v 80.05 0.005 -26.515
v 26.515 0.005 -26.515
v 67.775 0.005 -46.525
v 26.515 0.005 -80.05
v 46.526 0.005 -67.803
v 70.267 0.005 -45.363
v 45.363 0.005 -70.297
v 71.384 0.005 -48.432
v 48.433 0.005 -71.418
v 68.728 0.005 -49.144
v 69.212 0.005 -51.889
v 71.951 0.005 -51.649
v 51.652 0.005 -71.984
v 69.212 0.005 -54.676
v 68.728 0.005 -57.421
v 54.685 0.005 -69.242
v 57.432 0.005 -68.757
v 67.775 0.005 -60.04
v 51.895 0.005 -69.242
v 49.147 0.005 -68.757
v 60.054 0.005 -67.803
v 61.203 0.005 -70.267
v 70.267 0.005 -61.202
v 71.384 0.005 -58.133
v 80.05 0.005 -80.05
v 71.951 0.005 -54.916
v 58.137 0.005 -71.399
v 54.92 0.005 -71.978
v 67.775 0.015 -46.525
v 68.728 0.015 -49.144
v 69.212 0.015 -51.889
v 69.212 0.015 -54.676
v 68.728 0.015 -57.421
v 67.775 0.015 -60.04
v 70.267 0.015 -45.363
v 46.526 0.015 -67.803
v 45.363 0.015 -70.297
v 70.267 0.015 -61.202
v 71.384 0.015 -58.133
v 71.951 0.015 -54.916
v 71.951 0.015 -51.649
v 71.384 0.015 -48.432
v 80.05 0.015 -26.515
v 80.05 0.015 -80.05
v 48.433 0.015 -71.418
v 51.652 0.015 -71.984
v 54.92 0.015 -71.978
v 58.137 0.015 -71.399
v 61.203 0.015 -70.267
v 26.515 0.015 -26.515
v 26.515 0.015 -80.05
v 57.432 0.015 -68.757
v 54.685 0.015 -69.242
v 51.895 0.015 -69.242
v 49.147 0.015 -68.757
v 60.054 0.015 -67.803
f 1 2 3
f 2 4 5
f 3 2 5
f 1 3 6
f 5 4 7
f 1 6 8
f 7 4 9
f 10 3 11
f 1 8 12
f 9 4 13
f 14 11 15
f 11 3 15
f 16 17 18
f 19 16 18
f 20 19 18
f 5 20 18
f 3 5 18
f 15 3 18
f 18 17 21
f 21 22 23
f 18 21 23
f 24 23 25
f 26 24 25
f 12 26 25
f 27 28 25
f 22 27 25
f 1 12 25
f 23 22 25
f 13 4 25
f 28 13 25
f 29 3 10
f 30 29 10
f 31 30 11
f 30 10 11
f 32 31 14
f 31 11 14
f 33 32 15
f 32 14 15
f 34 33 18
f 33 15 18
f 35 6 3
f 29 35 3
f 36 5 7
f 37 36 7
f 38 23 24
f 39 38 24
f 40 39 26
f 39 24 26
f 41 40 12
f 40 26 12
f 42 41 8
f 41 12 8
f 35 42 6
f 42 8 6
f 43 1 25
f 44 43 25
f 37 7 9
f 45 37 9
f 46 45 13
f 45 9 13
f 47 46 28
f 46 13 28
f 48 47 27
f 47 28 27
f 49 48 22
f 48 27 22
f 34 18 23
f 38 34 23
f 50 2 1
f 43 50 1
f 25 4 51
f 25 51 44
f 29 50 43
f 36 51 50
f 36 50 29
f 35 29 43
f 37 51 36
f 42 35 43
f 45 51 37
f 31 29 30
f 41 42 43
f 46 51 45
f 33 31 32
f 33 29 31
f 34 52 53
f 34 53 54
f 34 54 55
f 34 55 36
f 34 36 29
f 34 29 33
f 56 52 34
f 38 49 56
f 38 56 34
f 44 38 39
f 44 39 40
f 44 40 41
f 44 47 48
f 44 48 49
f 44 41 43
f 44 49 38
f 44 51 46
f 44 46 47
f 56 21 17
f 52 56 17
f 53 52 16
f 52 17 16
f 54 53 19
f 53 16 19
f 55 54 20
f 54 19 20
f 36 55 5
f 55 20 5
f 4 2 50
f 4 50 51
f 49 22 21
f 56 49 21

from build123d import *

# Parameters (mm, degrees)
SKETCH1_W           = 107.07
SKETCH1_H           = 107.07
BOSS_EXTRUDE1_DEPTH = 0.02
SCALE1_SCALE        = 0.5


with BuildPart() as part:
    # Sketch1 → Boss-Extrude1 (new body)
    with BuildSketch(Plane(origin=(0, 0, 0), x_dir=(1, 0, 0), z_dir=(0, 1, 0))):
        with Locations((53.535, 53.535)):
            Rectangle(SKETCH1_W, SKETCH1_H)
        with BuildLine():
            Line((40.02098899, 82.576362505), (37.69526755, 87.563888229))
            ThreePointArc((37.69526755, 87.563888229), (53.541760789, 91.075404612), (69.37473245, 87.503415858))
            Line((69.37473245, 87.503415858), (67.077209739, 82.576362505))
            ThreePointArc((67.077209739, 82.576362505), (53.549099365, 85.57547237), (40.02098899, 82.576362505))
        make_face(mode=Mode.SUBTRACT)
        with BuildLine():
            Line((82.518723029, 67.05033201), (87.503415858, 69.37473245))
            ThreePointArc((87.503415858, 69.37473245), (91.015, 53.535), (87.503415858, 37.69526755))
            Line((87.503415858, 37.69526755), (82.518723029, 40.01966799))
            ThreePointArc((82.518723029, 40.01966799), (85.515, 53.535), (82.518723029, 67.05033201))
        make_face(mode=Mode.SUBTRACT)
    extrude(amount=BOSS_EXTRUDE1_DEPTH)


with BuildPart() as part_1:
    # Scale1: scaled about (53.030506877, 0.01, -53.029916686)
    add(part.part.scale(SCALE1_SCALE).moved(Location((26.515253439, 0.005, -26.514958343))))


solid = part_1.part
